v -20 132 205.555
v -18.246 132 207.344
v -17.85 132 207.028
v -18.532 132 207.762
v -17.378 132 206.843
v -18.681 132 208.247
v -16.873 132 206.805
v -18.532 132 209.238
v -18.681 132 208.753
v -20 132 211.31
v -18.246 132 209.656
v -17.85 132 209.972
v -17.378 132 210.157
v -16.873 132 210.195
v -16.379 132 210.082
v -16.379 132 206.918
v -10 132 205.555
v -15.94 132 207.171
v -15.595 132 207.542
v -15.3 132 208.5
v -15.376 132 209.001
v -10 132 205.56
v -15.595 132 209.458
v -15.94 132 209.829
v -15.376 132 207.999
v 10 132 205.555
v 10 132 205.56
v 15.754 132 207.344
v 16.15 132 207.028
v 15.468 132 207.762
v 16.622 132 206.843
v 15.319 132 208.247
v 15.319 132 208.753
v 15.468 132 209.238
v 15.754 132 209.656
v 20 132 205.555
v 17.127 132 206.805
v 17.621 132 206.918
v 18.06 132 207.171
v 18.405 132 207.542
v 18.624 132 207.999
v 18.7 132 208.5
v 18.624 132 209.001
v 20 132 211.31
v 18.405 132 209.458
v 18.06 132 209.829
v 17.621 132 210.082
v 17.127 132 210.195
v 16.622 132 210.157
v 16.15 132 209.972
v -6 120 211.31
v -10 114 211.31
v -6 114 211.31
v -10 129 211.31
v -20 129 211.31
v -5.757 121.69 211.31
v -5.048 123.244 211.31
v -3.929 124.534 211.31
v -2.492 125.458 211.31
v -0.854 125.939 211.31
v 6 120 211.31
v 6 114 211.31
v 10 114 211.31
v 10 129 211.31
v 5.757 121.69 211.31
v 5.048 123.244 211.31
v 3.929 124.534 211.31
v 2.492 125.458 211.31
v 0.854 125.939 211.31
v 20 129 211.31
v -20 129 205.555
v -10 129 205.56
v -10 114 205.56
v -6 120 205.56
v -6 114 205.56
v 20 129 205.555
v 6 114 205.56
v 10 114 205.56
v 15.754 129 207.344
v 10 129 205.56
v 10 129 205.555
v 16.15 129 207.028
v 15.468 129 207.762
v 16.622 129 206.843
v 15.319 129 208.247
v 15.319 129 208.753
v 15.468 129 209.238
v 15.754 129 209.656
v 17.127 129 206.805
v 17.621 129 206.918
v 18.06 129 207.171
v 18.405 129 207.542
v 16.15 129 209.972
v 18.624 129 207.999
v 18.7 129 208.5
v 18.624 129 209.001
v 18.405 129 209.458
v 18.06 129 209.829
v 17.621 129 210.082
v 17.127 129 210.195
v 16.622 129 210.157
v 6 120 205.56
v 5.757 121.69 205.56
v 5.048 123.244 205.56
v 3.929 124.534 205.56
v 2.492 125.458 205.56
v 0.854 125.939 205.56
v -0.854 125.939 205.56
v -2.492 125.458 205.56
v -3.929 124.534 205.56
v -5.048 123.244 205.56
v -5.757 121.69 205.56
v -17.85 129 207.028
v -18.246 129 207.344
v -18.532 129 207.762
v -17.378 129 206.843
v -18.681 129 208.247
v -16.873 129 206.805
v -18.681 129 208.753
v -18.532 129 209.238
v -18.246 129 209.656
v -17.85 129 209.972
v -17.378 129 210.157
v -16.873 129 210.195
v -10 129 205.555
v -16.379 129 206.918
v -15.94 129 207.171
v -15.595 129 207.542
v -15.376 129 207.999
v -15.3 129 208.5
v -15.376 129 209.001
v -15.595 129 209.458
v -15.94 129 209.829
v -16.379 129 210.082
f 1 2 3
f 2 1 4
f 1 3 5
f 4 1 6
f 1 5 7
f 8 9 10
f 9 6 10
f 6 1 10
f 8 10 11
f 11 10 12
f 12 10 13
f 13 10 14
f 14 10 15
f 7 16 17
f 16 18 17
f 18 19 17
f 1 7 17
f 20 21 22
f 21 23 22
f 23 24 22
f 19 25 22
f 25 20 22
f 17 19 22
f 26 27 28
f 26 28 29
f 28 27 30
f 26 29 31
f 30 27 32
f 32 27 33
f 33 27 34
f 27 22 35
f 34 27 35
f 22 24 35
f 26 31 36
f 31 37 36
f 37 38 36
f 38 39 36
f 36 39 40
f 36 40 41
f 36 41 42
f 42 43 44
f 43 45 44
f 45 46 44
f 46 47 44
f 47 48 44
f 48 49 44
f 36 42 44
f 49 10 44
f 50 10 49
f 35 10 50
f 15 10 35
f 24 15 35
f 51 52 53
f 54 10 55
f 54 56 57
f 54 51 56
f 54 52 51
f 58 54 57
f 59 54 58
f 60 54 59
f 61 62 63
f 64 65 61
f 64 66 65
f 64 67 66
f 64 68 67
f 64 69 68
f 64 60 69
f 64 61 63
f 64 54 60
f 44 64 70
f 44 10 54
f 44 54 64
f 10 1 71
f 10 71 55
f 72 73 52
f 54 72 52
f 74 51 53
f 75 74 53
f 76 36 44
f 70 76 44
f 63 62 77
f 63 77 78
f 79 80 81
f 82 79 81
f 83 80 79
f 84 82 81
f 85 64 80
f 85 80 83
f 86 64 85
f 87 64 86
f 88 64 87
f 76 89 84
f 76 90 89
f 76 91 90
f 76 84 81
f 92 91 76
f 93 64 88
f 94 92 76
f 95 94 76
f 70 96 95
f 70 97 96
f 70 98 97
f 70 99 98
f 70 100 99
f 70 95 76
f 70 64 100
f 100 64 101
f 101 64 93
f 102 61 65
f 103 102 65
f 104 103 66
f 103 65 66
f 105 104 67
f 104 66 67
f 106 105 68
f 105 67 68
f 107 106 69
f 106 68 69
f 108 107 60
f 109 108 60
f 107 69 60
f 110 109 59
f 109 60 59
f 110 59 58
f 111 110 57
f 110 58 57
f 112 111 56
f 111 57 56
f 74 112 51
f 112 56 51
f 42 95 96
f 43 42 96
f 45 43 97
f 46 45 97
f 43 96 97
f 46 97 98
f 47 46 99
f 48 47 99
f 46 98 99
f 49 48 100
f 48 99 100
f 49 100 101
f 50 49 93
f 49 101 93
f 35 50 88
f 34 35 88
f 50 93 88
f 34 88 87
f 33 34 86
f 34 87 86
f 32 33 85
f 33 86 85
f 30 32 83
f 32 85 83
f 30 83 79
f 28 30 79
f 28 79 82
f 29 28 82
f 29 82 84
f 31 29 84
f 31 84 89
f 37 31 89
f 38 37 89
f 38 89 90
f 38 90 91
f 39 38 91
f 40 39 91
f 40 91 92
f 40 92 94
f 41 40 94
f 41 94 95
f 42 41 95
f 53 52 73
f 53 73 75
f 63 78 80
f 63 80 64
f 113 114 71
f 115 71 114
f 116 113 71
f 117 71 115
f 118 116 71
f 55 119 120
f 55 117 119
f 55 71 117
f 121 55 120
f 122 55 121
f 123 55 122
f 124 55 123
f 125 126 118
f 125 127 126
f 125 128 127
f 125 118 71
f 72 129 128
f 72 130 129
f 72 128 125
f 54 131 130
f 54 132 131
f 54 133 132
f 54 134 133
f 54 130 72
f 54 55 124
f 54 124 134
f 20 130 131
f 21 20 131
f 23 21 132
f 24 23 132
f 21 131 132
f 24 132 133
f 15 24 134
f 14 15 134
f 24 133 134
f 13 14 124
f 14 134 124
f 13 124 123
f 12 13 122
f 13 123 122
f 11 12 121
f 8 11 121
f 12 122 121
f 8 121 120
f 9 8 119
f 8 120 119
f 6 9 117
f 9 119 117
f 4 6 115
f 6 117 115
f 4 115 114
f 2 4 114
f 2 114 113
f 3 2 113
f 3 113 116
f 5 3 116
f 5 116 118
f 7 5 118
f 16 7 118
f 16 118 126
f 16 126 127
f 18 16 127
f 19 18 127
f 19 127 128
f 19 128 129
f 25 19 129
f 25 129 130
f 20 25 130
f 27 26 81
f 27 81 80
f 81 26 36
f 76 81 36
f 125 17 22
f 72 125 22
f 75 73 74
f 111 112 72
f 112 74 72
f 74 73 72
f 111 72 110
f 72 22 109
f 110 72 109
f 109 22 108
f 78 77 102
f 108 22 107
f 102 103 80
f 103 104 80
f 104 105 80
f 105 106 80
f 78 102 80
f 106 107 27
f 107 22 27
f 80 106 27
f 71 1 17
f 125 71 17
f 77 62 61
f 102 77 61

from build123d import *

# Parameters (mm, degrees)
SKETCH091_W     = 20
SKETCH091_H     = 5.75
PAD030_DEPTH    = 18
POCKET028_DEPTH = 5.751
SKETCH093_W     = 10
SKETCH093_H     = 5.755
PAD031_DEPTH    = 3
SKETCH094_R     = 1.7
HOLE018_DEPTH   = 25


with BuildPart() as part:
    # Sketch091 → Pad030 (new body)
    with BuildSketch(Plane.XZ):
        with Locations((0, 208.435)):
            Rectangle(SKETCH091_W, SKETCH091_H)
    extrude(amount=PAD030_DEPTH)

    # Sketch092 (on Face4 of Pad030) → Pocket028 (cut, through all)
    with BuildSketch(Plane(origin=(0, 0, 211.31), x_dir=(-1, 0, 0), z_dir=(0, 0, 1))):
        with BuildLine():
            ThreePointArc((-6, 12), (0, 6), (6, 12))
            Line((6, 12), (6, 22))
            Line((-6, 22), (6, 22))
            Line((-6, 22), (-6, 12))
        make_face()
    extrude(amount=-POCKET028_DEPTH, mode=Mode.SUBTRACT)

    # Sketch093 → Pad031 (join)
    with BuildSketch(Plane.XZ):
        with Locations((-15, 208.4325)):
            Rectangle(SKETCH093_W, SKETCH093_H)
        with Locations((15, 208.4325)):
            Rectangle(SKETCH093_W, SKETCH093_H)
    extrude(amount=PAD031_DEPTH)

    # Sketch094 (on Face2 of Pad031) → Hole018 (cut)
    with BuildSketch(Plane.XZ.offset(3)):
        with Locations((-17, 208.5)):
            Circle(SKETCH094_R)
        with Locations((17, 208.5)):
            Circle(SKETCH094_R)
    extrude(amount=-HOLE018_DEPTH, mode=Mode.SUBTRACT)


with BuildPart() as part_1:
    # Body013 placement: moved
    add(part.part.moved(Location((0, 132, 0))))


solid = part_1.part
